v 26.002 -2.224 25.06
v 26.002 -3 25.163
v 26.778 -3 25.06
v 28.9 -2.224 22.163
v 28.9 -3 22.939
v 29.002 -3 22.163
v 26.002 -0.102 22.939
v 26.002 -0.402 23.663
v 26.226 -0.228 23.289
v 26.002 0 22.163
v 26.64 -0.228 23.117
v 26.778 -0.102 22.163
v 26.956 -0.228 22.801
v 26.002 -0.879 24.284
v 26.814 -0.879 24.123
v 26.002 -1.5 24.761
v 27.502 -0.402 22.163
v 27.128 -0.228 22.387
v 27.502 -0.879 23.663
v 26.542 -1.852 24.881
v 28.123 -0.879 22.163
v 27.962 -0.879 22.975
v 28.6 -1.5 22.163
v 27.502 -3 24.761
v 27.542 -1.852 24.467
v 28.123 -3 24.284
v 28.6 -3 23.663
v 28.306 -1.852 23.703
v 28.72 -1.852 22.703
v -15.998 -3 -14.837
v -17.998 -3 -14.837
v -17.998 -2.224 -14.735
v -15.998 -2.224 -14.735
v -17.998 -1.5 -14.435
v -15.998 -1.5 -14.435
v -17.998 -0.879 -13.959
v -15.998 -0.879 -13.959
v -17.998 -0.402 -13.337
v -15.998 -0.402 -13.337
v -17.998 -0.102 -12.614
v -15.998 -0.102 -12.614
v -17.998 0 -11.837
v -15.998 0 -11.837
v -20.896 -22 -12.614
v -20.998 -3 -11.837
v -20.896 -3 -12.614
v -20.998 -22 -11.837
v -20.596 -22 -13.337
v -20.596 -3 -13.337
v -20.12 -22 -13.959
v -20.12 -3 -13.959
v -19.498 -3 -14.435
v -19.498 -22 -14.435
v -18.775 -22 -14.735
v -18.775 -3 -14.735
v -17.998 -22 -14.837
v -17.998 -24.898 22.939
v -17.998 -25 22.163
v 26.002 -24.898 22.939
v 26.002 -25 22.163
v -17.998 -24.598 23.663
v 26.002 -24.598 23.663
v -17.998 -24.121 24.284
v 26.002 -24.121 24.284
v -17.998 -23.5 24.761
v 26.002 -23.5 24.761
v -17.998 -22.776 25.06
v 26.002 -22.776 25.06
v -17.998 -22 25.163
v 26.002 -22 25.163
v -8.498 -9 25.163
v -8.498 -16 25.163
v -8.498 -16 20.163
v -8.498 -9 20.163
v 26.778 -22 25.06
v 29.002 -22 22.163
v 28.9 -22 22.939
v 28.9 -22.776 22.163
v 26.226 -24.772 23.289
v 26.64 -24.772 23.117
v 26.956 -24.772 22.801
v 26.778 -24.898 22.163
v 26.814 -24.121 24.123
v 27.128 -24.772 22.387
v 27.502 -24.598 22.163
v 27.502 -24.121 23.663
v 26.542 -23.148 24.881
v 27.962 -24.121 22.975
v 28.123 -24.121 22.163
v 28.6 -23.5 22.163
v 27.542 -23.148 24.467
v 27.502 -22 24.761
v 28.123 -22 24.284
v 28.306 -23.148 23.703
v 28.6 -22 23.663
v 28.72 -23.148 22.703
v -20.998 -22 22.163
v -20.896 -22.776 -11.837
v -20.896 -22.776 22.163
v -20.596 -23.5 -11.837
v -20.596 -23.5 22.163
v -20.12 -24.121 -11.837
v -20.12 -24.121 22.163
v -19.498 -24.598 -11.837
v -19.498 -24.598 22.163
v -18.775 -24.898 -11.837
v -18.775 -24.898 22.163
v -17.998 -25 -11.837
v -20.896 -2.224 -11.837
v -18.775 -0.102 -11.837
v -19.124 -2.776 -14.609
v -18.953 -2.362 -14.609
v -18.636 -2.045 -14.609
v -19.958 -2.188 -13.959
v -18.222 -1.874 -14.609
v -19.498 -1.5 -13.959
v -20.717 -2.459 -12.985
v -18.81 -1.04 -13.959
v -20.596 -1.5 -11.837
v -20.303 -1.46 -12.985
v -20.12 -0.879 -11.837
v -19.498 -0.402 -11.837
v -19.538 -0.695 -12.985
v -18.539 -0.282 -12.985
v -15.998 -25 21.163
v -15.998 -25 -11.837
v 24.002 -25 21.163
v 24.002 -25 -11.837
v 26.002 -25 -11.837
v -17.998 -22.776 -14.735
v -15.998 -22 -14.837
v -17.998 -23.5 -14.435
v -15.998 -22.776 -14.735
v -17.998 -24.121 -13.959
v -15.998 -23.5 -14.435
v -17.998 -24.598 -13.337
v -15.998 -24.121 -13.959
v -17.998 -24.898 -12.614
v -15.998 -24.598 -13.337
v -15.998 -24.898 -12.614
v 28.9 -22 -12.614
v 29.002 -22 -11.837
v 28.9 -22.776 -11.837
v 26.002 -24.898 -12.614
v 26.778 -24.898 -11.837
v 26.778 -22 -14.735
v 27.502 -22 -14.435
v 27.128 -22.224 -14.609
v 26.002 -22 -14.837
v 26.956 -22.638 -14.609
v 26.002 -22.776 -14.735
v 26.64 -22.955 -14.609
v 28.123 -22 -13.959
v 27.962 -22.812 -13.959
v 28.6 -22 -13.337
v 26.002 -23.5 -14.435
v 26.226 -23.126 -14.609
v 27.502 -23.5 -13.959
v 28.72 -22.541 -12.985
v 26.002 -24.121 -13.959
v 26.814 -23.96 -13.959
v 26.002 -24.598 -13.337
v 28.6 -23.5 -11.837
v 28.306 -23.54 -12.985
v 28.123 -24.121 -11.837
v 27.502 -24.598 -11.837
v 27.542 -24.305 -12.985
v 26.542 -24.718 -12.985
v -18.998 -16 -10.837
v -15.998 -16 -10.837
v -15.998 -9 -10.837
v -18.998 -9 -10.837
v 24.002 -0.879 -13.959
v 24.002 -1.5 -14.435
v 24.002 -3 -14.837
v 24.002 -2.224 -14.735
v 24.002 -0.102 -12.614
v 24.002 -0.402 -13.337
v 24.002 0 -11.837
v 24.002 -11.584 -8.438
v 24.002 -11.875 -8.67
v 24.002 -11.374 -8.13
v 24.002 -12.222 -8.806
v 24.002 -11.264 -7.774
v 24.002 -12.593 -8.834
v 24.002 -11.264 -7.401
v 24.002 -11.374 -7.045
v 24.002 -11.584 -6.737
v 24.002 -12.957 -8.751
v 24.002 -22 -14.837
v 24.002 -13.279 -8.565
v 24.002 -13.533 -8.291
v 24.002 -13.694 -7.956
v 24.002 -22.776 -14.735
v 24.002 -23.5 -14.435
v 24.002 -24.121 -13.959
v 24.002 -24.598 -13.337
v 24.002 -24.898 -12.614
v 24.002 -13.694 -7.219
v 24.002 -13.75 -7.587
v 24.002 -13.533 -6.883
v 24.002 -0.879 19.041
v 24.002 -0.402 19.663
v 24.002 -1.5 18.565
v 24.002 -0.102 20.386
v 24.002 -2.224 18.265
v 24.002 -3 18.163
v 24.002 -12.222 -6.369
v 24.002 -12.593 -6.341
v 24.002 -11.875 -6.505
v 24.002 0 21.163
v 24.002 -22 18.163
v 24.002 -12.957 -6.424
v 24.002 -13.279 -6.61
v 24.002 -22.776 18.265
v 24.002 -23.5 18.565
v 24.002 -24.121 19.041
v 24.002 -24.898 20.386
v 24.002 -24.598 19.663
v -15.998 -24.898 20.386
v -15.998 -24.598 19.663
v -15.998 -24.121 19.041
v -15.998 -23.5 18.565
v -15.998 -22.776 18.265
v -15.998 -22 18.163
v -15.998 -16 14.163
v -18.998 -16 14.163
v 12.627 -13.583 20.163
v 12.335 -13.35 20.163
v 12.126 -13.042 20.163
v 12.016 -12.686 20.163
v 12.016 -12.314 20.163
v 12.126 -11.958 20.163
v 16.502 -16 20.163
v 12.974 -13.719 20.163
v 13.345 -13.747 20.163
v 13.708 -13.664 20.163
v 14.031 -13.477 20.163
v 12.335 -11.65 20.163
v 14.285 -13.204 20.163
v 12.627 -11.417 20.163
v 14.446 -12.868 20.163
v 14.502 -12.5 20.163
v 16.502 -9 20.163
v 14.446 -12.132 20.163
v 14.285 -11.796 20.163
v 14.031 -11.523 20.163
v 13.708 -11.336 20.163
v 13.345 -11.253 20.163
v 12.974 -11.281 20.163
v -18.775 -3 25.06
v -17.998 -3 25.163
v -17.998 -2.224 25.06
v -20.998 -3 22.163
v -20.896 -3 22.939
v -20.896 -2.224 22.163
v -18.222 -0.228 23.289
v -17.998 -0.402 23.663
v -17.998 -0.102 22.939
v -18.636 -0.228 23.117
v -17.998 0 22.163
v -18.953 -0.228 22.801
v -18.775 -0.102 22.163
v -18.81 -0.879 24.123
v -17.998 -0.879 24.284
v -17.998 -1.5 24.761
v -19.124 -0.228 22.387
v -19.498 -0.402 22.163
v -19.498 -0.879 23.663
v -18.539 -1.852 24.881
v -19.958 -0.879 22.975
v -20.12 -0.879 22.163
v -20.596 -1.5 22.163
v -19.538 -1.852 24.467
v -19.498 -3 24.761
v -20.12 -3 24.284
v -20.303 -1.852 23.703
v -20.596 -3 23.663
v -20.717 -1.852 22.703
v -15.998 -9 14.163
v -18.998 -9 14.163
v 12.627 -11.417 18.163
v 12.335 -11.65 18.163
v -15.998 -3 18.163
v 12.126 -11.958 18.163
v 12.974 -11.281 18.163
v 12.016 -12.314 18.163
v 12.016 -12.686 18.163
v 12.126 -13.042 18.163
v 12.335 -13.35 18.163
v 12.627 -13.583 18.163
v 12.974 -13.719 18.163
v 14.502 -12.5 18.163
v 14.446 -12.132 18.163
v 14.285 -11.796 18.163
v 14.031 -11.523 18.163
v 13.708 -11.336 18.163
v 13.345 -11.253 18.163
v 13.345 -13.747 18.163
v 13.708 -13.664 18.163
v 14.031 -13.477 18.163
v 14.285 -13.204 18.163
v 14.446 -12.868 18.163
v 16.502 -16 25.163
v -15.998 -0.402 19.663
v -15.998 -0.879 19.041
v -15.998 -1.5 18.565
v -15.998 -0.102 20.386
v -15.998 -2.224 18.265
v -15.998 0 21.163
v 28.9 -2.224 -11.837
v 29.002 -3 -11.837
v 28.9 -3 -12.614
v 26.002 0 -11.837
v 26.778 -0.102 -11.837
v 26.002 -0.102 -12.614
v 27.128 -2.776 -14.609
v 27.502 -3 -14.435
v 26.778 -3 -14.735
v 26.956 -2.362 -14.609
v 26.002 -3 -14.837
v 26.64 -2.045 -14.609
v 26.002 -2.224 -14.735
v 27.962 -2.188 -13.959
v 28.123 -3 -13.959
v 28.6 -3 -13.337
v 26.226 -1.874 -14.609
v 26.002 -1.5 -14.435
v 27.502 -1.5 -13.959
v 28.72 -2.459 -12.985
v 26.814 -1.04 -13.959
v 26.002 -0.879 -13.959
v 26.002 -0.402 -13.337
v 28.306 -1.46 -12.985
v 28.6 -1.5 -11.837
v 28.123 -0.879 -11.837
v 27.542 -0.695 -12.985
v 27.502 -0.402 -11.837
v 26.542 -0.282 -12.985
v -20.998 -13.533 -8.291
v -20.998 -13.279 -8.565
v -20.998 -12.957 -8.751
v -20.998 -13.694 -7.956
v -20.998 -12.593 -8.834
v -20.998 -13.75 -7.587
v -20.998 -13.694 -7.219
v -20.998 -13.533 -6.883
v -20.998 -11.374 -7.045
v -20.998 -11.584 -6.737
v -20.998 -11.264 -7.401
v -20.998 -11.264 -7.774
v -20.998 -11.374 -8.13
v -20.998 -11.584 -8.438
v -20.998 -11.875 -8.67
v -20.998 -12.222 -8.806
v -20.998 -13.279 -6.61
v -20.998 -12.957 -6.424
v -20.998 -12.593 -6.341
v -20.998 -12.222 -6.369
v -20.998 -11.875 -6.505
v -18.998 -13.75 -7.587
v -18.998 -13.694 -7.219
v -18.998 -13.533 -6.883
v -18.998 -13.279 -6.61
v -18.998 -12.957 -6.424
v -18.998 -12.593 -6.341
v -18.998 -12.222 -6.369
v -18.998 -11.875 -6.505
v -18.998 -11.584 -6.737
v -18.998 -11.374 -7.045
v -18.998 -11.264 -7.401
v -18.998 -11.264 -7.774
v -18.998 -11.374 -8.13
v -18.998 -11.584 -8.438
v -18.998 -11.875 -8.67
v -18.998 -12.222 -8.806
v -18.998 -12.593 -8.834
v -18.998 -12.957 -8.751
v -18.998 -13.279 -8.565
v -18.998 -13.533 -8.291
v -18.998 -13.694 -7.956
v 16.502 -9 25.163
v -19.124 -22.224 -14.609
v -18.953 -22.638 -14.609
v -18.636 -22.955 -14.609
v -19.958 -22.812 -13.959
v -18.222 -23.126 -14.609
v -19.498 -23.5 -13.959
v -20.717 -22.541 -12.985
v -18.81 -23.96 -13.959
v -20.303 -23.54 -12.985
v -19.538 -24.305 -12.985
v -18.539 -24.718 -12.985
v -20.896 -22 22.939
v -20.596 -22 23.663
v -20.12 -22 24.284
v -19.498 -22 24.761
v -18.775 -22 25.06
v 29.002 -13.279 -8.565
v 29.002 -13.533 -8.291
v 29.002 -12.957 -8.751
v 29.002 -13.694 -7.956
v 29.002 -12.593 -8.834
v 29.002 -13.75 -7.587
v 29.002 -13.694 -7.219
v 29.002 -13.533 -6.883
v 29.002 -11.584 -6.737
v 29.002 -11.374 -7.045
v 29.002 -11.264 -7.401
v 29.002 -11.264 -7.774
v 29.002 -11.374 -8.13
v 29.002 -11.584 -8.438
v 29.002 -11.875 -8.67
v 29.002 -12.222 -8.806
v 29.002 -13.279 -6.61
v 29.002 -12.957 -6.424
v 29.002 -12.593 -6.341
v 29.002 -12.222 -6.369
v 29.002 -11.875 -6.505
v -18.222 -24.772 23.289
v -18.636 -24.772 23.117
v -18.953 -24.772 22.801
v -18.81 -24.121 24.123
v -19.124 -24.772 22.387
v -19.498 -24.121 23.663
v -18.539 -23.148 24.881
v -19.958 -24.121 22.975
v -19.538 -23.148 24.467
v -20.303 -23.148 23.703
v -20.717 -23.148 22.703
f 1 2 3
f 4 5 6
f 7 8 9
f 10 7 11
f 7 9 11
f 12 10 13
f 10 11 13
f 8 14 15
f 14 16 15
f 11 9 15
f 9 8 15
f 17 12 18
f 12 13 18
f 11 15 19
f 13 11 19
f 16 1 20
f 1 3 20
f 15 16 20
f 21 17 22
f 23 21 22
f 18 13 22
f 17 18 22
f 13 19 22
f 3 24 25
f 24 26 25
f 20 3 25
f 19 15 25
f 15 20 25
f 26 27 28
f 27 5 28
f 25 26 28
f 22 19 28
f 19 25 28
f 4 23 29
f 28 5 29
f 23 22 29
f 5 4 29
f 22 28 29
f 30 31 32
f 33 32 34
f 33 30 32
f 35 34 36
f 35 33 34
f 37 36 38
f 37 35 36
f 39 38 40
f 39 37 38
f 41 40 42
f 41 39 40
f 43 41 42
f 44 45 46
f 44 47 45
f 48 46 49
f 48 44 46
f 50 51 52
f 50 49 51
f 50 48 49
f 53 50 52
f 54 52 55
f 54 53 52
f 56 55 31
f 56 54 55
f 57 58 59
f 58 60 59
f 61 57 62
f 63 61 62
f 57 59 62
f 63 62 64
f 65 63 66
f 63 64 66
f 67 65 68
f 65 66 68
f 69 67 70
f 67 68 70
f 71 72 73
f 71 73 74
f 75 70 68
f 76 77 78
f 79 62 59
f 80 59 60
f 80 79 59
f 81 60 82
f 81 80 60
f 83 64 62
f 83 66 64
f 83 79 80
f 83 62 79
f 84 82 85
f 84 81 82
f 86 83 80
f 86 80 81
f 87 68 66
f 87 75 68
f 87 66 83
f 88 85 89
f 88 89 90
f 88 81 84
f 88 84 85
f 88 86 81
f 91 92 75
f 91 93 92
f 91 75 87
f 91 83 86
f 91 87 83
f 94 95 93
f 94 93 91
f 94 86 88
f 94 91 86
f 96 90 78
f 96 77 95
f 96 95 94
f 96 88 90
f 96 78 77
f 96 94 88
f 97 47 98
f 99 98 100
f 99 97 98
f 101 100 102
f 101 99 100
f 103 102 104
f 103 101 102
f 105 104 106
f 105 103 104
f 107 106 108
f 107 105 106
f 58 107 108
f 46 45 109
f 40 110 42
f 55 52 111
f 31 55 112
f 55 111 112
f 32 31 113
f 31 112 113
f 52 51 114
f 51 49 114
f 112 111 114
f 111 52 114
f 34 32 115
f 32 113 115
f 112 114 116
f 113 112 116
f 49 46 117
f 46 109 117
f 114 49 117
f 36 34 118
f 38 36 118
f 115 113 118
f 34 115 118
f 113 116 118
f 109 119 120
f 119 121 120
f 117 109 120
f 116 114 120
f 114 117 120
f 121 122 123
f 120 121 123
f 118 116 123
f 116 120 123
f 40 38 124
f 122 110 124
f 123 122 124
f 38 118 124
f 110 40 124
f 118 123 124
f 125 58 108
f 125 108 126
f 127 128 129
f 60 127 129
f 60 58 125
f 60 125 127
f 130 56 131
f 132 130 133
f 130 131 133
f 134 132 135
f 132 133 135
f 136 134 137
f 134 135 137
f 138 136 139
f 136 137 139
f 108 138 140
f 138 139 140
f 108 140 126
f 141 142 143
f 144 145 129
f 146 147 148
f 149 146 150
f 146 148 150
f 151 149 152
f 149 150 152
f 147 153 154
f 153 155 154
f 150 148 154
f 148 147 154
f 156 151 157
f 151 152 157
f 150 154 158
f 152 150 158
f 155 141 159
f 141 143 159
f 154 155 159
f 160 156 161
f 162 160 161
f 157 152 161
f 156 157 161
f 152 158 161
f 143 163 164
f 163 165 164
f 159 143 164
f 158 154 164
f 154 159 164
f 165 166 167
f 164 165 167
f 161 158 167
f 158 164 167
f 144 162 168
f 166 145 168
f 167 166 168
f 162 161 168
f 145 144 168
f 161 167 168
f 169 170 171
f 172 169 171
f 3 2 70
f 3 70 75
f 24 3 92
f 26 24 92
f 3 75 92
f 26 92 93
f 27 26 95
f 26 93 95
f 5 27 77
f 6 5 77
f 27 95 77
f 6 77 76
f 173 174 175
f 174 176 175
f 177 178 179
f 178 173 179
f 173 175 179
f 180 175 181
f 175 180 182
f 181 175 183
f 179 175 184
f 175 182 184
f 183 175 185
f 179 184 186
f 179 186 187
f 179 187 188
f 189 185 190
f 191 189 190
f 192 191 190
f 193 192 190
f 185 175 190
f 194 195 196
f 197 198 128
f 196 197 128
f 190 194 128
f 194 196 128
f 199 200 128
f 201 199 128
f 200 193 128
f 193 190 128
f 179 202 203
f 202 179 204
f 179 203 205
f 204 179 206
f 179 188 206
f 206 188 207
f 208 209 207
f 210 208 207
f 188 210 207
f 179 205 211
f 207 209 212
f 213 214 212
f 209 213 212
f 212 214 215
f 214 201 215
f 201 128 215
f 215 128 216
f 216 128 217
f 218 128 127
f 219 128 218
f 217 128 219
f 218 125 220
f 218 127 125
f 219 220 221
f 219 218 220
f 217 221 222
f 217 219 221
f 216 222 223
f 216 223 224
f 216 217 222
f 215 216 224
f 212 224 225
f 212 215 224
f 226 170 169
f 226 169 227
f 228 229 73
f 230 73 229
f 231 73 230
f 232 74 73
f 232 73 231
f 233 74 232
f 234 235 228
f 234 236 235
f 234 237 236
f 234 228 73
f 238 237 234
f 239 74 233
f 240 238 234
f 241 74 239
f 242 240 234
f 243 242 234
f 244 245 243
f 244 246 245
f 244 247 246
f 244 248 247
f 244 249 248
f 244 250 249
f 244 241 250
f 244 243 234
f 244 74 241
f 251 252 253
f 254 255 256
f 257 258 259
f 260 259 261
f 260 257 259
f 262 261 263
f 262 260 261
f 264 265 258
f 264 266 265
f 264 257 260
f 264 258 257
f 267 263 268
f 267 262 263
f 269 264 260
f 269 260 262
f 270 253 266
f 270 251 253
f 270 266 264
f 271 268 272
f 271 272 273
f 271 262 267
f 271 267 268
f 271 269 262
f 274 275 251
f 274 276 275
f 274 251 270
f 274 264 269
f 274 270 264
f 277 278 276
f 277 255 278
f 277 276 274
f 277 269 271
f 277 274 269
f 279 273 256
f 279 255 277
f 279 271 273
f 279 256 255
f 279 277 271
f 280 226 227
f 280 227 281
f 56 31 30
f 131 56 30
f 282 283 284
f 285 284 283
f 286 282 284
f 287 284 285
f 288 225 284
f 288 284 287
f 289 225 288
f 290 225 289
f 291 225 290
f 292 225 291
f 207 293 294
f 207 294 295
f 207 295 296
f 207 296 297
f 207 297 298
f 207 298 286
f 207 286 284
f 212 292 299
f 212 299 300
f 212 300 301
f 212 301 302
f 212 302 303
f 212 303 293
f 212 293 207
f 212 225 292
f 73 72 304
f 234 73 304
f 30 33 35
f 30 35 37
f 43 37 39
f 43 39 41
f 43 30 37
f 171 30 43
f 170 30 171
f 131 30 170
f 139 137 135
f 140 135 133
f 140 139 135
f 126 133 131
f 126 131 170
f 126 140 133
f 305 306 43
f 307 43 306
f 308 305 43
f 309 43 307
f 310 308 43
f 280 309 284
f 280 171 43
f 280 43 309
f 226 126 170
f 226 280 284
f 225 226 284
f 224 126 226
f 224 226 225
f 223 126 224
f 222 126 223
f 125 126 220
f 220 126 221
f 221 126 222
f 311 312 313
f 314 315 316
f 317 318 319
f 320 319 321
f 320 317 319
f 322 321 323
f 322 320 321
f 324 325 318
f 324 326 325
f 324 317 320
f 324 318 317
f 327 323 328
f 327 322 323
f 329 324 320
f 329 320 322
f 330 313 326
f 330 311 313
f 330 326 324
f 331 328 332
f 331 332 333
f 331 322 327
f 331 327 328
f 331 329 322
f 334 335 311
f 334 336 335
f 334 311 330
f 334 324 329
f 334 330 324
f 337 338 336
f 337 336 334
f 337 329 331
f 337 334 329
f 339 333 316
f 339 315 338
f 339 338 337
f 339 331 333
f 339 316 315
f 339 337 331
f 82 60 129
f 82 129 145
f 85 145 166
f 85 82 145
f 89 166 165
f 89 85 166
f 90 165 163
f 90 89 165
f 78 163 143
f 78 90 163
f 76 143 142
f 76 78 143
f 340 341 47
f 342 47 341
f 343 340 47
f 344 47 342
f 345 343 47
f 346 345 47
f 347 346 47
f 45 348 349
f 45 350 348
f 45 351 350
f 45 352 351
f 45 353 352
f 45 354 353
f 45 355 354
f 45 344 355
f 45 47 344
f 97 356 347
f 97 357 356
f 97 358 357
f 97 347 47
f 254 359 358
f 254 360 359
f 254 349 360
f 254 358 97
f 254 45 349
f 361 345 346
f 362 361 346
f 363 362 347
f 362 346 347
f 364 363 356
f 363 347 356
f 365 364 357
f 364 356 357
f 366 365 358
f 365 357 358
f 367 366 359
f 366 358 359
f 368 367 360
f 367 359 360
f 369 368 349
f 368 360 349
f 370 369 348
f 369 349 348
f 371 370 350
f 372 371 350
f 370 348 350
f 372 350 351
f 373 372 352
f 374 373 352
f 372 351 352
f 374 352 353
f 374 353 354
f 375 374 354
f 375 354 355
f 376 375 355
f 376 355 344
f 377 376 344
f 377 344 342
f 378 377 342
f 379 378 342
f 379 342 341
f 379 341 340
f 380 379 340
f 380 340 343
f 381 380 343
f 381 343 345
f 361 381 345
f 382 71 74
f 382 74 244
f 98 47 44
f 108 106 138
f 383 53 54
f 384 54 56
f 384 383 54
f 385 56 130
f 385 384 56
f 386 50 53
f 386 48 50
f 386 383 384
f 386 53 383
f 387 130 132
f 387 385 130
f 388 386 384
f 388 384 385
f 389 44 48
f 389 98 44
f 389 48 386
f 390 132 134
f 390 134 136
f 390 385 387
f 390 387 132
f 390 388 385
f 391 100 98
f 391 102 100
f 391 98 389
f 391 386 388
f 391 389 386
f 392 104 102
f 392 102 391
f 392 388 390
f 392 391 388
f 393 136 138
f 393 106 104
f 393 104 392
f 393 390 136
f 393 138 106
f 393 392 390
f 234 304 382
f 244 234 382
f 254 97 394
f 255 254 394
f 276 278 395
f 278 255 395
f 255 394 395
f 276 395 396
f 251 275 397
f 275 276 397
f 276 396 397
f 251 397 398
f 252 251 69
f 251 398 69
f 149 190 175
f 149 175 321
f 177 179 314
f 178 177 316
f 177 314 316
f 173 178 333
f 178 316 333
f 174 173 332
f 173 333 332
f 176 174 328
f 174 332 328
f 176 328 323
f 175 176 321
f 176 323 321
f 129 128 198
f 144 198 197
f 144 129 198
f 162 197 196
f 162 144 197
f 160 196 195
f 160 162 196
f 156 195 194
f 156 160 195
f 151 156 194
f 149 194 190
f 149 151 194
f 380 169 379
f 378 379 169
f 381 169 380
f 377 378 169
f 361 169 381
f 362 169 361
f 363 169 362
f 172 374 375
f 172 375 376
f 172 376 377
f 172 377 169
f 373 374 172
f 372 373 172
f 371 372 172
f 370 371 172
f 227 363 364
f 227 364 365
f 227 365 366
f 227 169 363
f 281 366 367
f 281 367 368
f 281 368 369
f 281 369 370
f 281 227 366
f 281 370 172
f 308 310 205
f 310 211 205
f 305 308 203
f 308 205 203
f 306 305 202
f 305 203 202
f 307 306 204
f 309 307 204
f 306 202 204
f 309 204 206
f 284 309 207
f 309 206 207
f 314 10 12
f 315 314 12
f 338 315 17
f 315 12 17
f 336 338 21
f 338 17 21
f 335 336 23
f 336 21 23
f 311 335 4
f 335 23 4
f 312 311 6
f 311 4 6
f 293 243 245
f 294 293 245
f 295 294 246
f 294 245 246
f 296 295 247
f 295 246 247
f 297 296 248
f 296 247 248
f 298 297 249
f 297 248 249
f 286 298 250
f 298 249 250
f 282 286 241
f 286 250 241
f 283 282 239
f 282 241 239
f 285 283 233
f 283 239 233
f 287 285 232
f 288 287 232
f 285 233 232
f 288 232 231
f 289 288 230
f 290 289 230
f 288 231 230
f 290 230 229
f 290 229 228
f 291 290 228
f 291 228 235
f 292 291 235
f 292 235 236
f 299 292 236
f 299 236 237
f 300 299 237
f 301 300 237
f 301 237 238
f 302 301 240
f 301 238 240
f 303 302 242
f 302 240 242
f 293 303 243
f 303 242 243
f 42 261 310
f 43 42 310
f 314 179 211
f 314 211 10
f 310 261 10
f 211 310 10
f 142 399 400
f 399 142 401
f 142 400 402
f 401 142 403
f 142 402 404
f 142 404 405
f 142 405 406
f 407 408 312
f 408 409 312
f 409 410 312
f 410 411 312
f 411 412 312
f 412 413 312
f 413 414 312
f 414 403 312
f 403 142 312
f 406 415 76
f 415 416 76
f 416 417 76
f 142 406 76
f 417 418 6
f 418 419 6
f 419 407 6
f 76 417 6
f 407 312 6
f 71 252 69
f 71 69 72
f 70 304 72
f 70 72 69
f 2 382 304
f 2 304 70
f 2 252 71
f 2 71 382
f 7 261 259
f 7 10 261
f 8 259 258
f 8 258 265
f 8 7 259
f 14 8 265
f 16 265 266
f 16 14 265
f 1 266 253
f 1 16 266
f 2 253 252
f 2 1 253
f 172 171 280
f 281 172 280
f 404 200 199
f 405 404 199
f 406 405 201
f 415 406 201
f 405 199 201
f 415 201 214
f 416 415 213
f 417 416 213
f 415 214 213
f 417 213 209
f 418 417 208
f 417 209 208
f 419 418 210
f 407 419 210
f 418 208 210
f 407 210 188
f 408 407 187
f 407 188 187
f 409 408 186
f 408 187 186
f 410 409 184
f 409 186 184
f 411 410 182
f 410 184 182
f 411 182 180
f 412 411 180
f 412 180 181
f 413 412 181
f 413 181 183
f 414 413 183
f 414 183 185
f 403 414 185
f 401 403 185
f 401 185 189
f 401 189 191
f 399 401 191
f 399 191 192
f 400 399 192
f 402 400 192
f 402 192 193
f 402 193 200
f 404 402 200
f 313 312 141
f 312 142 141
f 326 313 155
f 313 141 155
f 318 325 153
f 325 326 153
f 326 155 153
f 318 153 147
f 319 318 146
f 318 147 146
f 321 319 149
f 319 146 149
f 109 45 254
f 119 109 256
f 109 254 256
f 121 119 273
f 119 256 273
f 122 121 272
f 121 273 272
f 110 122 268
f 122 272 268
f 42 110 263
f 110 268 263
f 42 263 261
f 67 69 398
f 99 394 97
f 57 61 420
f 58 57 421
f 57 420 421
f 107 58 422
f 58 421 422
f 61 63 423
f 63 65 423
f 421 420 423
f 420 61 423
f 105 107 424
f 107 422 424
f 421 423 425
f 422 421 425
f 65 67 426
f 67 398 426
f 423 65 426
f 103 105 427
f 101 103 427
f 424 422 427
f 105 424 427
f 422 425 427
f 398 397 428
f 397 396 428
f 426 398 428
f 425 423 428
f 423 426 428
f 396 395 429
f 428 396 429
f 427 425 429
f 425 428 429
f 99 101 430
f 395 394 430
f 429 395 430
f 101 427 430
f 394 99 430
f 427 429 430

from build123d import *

# Parameters (mm, degrees)
F0_W      = 50
F0_H      = 40
F1_DEPTH  = 25
F2_W      = 40
F2_H      = 33
F3_DEPTH  = 25.001
F4_W      = 7
F4_H      = 25
F5_DEPTH  = 3
F6_R      = 1.25
F7_DEPTH  = 50.001
F8_W      = 25
F8_H      = 7
F9_DEPTH  = 5
F10_R     = 1.25
F11_DEPTH = 2
F12_R     = 3


with BuildPart() as f1:
    # F0 (on Front) → F1 (new body)
    with BuildSketch(Plane.XZ):
        with Locations((4.001731, 5.162706)):
            Rectangle(F0_W, F0_H)
    extrude(amount=F1_DEPTH)

    # F2 (on face) → F3 (cut, through all)
    with BuildSketch(Plane.XZ.offset(25)):
        with Locations((4.001731, 1.662706)):
            Rectangle(F2_W, F2_H)
    extrude(amount=-F3_DEPTH, mode=Mode.SUBTRACT)

    # F4 (on face) → F5 (cut)
    with BuildSketch(Plane.YZ.offset(-15.998269)):
        with Locations((-12.5, 1.662706)):
            Rectangle(F4_W, F4_H)
    extrude(amount=-F5_DEPTH, mode=Mode.SUBTRACT)

    # F6 (on face) → F7 (cut, through all)
    with BuildSketch(Plane(origin=(-20.998269, 0, 0), x_dir=(0, -1, 0), z_dir=(-1, 0, 0))):
        with Locations((12.5, -7.587294)):
            Circle(F6_R)
    extrude(amount=-F7_DEPTH, mode=Mode.SUBTRACT)

    # F8 (on face) → F9 (cut)
    with BuildSketch(Plane.XY.offset(25.162706)):
        with Locations((4.001731, -12.5)):
            Rectangle(F8_W, F8_H)
    extrude(amount=-F9_DEPTH, mode=Mode.SUBTRACT)

    # F10 (on face) → F11 (cut)
    with BuildSketch(Plane.XY.offset(20.162706)):
        with Locations((13.251731, -12.5)):
            Circle(F10_R)
    extrude(amount=-F11_DEPTH, mode=Mode.SUBTRACT)

    # F12
    f12_edges = [f1.edges().sort_by_distance(p)[0] for p in [
        (29.001731, -12.5, 25.162706),
        (-20.998269, -12.5, 25.162706),
        (4.001731, 0, 25.162706),
        (4.001731, -25, 25.162706),
        (29.001731, -25, 5.162706),
        (29.001731, 0, 5.162706),
        (-20.998269, -25, 5.162706),
        (-20.998269, 0, 5.162706),
        (-20.998269, -12.5, -14.837294),
        (29.001731, -12.5, -14.837294),
        (26.501731, -25, -14.837294),
        (-18.498269, -25, -14.837294),
        (26.501731, 0, -14.837294),
        (-18.498269, 0, -14.837294),
        (4.001731, -25, 18.162706),
        (4.001731, 0, 18.162706),
    ]]
    fillet(f12_edges, radius=F12_R)


solid = f1.part
